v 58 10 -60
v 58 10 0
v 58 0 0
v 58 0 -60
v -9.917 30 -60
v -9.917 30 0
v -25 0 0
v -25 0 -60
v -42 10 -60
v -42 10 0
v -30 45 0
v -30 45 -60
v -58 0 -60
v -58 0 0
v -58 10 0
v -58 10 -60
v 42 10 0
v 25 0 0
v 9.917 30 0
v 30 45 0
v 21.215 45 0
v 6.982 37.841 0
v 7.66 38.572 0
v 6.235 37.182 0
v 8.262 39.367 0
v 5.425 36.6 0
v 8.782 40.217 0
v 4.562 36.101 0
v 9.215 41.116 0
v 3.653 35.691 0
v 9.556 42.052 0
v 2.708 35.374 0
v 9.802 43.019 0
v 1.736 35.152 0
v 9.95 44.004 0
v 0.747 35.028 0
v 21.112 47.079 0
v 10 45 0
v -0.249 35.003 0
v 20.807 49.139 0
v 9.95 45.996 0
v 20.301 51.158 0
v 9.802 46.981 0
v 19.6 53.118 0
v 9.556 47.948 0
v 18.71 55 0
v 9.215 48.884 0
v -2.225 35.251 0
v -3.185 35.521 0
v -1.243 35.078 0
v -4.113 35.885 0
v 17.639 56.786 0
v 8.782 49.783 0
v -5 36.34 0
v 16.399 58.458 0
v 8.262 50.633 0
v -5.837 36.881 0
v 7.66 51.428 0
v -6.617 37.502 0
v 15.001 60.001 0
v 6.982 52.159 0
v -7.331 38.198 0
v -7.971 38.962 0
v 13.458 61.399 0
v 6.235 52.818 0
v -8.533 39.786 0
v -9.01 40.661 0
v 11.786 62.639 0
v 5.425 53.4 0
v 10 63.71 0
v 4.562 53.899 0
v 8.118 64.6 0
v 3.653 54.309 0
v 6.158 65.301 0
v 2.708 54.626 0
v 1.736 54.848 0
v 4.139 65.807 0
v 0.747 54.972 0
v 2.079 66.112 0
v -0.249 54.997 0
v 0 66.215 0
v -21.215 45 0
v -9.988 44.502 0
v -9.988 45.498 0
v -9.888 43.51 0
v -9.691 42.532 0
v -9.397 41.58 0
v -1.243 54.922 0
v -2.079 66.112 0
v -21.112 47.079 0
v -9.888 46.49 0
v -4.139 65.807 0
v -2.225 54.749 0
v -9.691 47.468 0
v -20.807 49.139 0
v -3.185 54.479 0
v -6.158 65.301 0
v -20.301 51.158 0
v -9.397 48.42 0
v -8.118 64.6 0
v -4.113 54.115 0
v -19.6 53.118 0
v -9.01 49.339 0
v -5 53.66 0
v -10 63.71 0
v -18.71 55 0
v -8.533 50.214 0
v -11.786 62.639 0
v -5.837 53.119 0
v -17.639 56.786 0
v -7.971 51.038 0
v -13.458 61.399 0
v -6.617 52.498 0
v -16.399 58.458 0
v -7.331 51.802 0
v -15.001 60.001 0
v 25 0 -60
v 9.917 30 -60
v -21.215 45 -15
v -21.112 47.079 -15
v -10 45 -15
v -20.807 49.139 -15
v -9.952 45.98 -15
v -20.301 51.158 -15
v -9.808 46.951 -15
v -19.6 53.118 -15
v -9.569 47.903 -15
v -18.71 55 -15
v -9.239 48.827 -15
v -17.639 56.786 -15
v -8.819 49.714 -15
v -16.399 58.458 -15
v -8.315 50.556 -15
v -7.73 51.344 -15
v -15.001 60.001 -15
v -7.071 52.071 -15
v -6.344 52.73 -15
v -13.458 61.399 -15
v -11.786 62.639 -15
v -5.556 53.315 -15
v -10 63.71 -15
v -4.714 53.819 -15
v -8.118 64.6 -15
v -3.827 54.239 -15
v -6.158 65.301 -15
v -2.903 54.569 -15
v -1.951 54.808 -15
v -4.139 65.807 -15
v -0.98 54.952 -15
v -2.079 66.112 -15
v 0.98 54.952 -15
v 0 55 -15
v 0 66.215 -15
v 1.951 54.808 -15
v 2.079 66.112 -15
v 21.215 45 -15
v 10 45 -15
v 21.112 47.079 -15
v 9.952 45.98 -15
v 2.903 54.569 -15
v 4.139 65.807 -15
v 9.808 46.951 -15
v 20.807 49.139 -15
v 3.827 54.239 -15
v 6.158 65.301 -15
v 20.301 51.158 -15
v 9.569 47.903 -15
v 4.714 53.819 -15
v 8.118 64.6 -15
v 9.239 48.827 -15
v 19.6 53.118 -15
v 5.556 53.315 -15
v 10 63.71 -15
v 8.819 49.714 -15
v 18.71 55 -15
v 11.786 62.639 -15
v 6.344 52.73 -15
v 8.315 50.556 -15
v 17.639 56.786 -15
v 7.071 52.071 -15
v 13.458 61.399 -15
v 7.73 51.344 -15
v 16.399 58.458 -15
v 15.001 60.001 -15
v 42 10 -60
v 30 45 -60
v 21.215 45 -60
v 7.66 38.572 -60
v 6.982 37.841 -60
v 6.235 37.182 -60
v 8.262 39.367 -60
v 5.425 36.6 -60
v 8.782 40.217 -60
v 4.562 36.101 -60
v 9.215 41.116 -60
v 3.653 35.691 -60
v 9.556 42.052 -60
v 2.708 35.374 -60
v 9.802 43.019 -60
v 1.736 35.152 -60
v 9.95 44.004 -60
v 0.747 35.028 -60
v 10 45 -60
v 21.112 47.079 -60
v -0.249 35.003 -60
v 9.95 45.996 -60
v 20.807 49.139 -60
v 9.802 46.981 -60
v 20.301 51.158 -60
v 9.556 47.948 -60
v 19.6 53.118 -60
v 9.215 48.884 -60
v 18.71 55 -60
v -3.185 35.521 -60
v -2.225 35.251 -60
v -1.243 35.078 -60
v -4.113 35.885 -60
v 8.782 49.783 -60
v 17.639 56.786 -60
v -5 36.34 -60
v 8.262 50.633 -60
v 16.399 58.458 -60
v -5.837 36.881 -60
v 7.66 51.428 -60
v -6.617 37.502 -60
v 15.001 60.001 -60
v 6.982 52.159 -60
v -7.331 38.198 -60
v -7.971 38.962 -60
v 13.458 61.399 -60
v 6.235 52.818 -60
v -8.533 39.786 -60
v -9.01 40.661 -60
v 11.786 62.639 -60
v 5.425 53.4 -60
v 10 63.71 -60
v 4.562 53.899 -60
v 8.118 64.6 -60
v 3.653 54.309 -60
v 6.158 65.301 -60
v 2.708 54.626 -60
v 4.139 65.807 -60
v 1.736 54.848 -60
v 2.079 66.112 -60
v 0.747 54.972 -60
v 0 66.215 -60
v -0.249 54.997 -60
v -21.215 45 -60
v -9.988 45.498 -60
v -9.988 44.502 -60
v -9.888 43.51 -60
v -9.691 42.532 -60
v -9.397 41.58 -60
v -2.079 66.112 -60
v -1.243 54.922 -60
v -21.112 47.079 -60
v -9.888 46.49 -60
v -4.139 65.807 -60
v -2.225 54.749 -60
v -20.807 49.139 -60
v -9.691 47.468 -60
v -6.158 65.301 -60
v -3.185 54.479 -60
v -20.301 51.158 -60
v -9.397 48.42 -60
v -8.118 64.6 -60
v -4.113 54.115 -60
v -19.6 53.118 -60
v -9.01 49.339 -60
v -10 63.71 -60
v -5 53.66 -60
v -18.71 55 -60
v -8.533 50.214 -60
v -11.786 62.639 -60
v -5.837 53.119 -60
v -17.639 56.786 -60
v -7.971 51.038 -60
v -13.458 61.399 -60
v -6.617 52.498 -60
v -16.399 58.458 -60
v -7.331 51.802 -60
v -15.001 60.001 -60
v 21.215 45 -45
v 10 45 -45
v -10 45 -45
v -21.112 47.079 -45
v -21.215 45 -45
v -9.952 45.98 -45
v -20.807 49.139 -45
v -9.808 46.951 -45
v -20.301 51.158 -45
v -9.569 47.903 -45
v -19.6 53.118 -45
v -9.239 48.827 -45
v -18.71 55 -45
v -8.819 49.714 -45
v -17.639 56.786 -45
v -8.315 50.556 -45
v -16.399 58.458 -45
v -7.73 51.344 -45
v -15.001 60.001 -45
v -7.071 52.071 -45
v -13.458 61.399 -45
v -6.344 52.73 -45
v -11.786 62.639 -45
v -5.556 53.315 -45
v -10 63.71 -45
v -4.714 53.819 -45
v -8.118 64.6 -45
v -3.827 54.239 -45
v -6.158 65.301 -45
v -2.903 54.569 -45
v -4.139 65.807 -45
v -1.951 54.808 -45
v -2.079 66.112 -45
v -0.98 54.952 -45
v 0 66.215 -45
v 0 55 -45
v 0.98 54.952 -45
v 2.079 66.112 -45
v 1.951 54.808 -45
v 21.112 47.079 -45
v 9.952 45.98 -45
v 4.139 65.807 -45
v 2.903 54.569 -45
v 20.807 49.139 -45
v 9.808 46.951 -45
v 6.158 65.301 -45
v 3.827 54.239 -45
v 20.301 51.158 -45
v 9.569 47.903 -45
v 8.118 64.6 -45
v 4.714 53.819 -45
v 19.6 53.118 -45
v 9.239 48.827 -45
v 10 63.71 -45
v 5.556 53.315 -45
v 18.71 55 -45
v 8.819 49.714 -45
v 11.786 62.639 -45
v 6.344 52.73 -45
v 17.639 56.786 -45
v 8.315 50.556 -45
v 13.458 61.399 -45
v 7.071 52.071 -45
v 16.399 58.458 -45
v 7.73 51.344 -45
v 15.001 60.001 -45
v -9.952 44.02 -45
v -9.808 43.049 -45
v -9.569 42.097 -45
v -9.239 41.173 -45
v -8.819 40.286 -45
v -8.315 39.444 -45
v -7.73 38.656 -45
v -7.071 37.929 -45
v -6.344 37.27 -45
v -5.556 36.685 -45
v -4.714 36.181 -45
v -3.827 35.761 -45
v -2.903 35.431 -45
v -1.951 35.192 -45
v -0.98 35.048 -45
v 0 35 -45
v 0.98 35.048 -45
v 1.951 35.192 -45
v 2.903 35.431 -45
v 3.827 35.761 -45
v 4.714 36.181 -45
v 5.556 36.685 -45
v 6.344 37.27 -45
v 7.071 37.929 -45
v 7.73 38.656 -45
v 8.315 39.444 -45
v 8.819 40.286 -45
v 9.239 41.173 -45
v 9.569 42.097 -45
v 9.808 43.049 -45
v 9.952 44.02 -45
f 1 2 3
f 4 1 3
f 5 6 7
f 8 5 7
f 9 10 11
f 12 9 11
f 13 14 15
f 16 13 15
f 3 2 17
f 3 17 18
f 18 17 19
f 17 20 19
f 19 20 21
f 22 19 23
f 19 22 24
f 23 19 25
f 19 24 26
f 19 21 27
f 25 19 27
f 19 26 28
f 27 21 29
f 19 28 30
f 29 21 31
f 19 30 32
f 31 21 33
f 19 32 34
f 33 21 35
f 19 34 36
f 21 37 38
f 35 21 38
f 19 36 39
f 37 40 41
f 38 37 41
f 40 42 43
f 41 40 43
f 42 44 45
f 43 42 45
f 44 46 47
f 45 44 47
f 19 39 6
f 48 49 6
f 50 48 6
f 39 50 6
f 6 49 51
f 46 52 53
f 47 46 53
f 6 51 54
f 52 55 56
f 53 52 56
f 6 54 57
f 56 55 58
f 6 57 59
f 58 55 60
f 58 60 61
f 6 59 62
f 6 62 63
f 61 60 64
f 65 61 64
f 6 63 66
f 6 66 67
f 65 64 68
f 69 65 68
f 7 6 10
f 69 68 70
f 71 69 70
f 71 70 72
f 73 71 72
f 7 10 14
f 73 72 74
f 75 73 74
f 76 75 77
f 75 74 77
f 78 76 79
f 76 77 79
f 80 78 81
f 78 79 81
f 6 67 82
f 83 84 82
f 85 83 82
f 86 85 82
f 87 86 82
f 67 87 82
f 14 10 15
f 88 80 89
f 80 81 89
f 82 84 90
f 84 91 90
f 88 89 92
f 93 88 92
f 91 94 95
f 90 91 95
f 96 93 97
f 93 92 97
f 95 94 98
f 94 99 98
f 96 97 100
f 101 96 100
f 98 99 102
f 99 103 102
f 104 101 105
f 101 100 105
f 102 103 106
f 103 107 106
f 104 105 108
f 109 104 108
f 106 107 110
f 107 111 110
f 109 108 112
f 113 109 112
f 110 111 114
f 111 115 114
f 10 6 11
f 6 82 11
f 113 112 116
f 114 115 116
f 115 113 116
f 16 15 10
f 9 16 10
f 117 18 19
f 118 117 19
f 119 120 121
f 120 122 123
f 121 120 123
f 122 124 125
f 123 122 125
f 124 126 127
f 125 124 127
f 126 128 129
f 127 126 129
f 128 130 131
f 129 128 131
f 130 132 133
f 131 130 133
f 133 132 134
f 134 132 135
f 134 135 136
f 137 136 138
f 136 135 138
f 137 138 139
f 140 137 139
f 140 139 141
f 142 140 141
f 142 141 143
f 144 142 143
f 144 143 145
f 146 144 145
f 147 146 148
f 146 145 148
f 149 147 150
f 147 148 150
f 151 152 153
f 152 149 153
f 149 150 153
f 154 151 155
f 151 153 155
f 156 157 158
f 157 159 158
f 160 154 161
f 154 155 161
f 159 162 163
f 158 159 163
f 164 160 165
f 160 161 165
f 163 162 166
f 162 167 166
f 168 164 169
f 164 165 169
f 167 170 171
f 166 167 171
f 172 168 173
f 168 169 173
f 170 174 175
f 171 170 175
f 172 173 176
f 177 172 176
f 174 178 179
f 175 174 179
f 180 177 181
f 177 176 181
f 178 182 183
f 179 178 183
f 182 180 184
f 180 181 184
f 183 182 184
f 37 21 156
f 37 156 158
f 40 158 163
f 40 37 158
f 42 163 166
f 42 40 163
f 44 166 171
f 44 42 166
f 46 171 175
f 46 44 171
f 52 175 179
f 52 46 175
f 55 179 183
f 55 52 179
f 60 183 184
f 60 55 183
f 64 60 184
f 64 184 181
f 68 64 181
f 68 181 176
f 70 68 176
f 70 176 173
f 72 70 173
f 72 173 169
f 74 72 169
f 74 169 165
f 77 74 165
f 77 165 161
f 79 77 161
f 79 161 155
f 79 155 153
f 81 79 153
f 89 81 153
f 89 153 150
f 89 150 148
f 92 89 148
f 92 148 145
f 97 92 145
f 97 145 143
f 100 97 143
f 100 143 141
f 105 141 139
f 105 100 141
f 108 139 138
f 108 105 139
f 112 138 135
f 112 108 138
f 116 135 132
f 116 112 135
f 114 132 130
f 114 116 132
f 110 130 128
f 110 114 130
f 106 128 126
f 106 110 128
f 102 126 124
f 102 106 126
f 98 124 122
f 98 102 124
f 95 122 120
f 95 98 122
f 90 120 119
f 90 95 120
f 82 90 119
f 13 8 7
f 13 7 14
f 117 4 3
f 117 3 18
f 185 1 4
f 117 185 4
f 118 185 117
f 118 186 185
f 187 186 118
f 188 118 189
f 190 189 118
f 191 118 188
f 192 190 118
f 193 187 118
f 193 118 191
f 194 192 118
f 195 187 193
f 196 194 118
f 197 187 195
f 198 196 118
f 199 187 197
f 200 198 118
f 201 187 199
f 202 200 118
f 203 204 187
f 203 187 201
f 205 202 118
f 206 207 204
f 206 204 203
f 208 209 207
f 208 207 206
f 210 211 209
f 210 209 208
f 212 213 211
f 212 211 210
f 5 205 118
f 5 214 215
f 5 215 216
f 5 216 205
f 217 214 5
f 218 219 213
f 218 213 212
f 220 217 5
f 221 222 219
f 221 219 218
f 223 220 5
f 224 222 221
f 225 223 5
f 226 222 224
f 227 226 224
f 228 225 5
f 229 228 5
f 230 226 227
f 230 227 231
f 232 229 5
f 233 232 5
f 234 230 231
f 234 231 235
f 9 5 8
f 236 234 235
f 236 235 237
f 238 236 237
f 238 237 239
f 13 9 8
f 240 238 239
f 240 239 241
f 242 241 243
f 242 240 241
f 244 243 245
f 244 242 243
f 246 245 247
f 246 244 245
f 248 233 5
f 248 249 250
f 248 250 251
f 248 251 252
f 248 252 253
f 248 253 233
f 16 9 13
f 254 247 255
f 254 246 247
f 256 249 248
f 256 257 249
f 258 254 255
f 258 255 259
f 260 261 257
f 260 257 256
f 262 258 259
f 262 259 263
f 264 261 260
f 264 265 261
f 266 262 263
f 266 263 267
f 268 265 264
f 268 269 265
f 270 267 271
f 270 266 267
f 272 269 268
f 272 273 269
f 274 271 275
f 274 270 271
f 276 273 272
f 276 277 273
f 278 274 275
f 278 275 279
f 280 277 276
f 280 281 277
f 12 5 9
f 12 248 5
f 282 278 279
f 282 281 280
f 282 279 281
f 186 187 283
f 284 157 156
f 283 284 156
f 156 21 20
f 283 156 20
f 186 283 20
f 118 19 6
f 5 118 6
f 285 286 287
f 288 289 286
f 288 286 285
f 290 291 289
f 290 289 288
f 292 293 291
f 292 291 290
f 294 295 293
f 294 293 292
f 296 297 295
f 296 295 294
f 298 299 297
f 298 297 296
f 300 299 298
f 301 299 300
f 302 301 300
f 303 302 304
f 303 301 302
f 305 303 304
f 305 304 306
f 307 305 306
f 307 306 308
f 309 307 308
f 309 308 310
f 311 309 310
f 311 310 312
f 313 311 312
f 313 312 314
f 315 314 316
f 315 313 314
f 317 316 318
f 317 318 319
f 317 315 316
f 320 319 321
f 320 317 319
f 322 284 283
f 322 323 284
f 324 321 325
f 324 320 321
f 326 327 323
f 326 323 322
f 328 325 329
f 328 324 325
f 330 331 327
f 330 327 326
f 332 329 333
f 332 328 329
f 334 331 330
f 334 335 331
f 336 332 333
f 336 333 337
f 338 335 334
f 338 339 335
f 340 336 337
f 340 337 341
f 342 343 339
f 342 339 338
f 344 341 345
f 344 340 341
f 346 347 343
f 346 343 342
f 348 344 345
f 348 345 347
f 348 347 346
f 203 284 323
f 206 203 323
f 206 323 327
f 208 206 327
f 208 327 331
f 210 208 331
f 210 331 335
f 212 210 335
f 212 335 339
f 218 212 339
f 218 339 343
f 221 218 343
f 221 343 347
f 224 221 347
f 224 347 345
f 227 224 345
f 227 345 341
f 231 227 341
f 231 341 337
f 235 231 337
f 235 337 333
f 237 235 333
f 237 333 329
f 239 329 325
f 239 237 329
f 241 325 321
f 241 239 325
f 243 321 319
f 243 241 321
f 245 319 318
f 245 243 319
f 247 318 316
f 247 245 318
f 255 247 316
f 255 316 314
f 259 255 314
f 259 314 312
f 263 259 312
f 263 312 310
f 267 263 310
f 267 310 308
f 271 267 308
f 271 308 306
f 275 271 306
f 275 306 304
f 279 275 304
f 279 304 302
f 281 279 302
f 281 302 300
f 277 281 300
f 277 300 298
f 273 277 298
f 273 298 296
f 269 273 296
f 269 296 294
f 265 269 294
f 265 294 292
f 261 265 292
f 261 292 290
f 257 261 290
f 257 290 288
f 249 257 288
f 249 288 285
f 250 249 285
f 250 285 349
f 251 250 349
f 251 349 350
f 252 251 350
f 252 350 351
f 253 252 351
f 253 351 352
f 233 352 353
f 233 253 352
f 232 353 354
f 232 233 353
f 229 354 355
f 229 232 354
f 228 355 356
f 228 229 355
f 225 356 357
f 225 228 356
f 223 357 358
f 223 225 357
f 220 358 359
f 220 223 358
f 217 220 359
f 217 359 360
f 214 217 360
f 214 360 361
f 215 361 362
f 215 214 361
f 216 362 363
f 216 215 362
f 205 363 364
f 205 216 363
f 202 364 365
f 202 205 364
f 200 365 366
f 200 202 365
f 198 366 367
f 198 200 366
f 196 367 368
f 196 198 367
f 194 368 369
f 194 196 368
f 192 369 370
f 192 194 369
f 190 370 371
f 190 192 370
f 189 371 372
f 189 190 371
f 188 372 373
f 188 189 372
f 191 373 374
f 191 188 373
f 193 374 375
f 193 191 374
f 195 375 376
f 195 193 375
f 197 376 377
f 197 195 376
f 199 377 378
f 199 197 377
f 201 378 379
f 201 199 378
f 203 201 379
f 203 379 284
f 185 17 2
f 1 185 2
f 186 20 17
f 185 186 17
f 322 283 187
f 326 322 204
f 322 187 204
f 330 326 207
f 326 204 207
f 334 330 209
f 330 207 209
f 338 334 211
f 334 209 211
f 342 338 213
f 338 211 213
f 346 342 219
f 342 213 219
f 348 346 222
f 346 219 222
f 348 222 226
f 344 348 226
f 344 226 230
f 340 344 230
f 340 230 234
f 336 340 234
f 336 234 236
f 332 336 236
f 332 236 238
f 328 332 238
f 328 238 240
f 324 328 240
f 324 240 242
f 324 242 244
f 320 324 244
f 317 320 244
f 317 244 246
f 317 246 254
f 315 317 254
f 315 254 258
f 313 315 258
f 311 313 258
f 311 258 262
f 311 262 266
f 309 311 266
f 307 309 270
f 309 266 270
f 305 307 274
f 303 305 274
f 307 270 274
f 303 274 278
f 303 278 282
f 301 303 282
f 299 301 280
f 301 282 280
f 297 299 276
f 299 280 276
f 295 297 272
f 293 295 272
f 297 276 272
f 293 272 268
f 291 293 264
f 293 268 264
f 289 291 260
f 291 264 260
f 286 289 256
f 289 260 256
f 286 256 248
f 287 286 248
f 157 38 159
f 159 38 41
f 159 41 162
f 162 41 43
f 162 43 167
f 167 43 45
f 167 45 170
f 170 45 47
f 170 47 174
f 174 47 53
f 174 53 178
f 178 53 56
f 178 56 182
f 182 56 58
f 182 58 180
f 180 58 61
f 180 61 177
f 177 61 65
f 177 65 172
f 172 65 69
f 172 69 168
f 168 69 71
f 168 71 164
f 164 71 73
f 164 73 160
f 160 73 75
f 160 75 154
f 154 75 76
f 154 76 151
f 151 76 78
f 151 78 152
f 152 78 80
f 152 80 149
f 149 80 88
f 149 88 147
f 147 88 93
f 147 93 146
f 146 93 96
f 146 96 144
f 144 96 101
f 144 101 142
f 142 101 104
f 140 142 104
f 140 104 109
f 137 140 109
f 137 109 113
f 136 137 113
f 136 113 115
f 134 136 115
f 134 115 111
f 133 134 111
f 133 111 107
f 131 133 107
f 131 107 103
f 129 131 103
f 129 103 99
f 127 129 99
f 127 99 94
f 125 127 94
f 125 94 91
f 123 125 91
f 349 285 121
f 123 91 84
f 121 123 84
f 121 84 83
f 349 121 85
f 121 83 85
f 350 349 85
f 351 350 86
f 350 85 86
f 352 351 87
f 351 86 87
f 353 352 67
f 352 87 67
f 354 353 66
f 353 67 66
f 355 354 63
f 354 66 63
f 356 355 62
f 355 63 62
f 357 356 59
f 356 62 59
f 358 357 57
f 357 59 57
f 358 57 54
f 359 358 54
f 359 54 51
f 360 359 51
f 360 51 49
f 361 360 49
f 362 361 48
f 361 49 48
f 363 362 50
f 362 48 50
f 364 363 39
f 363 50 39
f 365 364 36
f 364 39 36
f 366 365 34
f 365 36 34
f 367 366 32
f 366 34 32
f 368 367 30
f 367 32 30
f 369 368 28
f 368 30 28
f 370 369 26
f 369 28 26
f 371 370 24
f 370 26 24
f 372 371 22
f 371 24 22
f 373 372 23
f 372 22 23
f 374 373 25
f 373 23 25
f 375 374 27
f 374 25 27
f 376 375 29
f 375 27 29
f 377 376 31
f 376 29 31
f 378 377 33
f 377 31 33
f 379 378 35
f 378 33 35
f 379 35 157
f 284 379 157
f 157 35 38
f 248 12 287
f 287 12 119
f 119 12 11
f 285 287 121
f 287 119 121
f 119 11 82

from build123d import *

# Parameters (mm, degrees)
BOSS_EXTRUDE1_DEPTH = 60
BOSS_EXTRUDE2_DEPTH = 15
SKETCH5_R           = 10
CUT_EXTRUDE1_DEPTH  = 107.5286833


with BuildPart() as part:
    # Sketch1 → Boss-Extrude1 (new body)
    with BuildSketch(Plane.XY):
        Polygon((-58, 0), (-58, 10), (-42, 10), (-30, 45), (30, 45), (42, 10), (58, 10), (58, 0), (25, 0), (9.917302162, 30), (-9.917302162, 30), (-25, 0), align=None)
    extrude(amount=-BOSS_EXTRUDE1_DEPTH)

    # Sketch2 → Boss-Extrude2 (add)
    with BuildSketch(Plane.XY):
        with BuildLine():
            Line((-18.06294145, 33.874117101), (18.06294145, 33.874117101))
            ThreePointArc((18.06294145, 33.874117101), (0, 66.214502683), (-18.06294145, 33.874117101))
        make_face()
    boss_extrude2 = extrude(amount=-BOSS_EXTRUDE2_DEPTH)

    # Sketch5 → Cut-Extrude1 (cut, through all)
    with BuildSketch(Plane.XY):
        with Locations((0, 45)):
            Circle(SKETCH5_R)
    cut_extrude1 = extrude(amount=-CUT_EXTRUDE1_DEPTH, mode=Mode.SUBTRACT)

    # Mirror1: Boss-Extrude2, Cut-Extrude1 across plane
    add(boss_extrude2.mirror(Plane.XY.offset(-30)))
    add(cut_extrude1.mirror(Plane.XY.offset(-30)), mode=Mode.SUBTRACT)


solid = part.part
